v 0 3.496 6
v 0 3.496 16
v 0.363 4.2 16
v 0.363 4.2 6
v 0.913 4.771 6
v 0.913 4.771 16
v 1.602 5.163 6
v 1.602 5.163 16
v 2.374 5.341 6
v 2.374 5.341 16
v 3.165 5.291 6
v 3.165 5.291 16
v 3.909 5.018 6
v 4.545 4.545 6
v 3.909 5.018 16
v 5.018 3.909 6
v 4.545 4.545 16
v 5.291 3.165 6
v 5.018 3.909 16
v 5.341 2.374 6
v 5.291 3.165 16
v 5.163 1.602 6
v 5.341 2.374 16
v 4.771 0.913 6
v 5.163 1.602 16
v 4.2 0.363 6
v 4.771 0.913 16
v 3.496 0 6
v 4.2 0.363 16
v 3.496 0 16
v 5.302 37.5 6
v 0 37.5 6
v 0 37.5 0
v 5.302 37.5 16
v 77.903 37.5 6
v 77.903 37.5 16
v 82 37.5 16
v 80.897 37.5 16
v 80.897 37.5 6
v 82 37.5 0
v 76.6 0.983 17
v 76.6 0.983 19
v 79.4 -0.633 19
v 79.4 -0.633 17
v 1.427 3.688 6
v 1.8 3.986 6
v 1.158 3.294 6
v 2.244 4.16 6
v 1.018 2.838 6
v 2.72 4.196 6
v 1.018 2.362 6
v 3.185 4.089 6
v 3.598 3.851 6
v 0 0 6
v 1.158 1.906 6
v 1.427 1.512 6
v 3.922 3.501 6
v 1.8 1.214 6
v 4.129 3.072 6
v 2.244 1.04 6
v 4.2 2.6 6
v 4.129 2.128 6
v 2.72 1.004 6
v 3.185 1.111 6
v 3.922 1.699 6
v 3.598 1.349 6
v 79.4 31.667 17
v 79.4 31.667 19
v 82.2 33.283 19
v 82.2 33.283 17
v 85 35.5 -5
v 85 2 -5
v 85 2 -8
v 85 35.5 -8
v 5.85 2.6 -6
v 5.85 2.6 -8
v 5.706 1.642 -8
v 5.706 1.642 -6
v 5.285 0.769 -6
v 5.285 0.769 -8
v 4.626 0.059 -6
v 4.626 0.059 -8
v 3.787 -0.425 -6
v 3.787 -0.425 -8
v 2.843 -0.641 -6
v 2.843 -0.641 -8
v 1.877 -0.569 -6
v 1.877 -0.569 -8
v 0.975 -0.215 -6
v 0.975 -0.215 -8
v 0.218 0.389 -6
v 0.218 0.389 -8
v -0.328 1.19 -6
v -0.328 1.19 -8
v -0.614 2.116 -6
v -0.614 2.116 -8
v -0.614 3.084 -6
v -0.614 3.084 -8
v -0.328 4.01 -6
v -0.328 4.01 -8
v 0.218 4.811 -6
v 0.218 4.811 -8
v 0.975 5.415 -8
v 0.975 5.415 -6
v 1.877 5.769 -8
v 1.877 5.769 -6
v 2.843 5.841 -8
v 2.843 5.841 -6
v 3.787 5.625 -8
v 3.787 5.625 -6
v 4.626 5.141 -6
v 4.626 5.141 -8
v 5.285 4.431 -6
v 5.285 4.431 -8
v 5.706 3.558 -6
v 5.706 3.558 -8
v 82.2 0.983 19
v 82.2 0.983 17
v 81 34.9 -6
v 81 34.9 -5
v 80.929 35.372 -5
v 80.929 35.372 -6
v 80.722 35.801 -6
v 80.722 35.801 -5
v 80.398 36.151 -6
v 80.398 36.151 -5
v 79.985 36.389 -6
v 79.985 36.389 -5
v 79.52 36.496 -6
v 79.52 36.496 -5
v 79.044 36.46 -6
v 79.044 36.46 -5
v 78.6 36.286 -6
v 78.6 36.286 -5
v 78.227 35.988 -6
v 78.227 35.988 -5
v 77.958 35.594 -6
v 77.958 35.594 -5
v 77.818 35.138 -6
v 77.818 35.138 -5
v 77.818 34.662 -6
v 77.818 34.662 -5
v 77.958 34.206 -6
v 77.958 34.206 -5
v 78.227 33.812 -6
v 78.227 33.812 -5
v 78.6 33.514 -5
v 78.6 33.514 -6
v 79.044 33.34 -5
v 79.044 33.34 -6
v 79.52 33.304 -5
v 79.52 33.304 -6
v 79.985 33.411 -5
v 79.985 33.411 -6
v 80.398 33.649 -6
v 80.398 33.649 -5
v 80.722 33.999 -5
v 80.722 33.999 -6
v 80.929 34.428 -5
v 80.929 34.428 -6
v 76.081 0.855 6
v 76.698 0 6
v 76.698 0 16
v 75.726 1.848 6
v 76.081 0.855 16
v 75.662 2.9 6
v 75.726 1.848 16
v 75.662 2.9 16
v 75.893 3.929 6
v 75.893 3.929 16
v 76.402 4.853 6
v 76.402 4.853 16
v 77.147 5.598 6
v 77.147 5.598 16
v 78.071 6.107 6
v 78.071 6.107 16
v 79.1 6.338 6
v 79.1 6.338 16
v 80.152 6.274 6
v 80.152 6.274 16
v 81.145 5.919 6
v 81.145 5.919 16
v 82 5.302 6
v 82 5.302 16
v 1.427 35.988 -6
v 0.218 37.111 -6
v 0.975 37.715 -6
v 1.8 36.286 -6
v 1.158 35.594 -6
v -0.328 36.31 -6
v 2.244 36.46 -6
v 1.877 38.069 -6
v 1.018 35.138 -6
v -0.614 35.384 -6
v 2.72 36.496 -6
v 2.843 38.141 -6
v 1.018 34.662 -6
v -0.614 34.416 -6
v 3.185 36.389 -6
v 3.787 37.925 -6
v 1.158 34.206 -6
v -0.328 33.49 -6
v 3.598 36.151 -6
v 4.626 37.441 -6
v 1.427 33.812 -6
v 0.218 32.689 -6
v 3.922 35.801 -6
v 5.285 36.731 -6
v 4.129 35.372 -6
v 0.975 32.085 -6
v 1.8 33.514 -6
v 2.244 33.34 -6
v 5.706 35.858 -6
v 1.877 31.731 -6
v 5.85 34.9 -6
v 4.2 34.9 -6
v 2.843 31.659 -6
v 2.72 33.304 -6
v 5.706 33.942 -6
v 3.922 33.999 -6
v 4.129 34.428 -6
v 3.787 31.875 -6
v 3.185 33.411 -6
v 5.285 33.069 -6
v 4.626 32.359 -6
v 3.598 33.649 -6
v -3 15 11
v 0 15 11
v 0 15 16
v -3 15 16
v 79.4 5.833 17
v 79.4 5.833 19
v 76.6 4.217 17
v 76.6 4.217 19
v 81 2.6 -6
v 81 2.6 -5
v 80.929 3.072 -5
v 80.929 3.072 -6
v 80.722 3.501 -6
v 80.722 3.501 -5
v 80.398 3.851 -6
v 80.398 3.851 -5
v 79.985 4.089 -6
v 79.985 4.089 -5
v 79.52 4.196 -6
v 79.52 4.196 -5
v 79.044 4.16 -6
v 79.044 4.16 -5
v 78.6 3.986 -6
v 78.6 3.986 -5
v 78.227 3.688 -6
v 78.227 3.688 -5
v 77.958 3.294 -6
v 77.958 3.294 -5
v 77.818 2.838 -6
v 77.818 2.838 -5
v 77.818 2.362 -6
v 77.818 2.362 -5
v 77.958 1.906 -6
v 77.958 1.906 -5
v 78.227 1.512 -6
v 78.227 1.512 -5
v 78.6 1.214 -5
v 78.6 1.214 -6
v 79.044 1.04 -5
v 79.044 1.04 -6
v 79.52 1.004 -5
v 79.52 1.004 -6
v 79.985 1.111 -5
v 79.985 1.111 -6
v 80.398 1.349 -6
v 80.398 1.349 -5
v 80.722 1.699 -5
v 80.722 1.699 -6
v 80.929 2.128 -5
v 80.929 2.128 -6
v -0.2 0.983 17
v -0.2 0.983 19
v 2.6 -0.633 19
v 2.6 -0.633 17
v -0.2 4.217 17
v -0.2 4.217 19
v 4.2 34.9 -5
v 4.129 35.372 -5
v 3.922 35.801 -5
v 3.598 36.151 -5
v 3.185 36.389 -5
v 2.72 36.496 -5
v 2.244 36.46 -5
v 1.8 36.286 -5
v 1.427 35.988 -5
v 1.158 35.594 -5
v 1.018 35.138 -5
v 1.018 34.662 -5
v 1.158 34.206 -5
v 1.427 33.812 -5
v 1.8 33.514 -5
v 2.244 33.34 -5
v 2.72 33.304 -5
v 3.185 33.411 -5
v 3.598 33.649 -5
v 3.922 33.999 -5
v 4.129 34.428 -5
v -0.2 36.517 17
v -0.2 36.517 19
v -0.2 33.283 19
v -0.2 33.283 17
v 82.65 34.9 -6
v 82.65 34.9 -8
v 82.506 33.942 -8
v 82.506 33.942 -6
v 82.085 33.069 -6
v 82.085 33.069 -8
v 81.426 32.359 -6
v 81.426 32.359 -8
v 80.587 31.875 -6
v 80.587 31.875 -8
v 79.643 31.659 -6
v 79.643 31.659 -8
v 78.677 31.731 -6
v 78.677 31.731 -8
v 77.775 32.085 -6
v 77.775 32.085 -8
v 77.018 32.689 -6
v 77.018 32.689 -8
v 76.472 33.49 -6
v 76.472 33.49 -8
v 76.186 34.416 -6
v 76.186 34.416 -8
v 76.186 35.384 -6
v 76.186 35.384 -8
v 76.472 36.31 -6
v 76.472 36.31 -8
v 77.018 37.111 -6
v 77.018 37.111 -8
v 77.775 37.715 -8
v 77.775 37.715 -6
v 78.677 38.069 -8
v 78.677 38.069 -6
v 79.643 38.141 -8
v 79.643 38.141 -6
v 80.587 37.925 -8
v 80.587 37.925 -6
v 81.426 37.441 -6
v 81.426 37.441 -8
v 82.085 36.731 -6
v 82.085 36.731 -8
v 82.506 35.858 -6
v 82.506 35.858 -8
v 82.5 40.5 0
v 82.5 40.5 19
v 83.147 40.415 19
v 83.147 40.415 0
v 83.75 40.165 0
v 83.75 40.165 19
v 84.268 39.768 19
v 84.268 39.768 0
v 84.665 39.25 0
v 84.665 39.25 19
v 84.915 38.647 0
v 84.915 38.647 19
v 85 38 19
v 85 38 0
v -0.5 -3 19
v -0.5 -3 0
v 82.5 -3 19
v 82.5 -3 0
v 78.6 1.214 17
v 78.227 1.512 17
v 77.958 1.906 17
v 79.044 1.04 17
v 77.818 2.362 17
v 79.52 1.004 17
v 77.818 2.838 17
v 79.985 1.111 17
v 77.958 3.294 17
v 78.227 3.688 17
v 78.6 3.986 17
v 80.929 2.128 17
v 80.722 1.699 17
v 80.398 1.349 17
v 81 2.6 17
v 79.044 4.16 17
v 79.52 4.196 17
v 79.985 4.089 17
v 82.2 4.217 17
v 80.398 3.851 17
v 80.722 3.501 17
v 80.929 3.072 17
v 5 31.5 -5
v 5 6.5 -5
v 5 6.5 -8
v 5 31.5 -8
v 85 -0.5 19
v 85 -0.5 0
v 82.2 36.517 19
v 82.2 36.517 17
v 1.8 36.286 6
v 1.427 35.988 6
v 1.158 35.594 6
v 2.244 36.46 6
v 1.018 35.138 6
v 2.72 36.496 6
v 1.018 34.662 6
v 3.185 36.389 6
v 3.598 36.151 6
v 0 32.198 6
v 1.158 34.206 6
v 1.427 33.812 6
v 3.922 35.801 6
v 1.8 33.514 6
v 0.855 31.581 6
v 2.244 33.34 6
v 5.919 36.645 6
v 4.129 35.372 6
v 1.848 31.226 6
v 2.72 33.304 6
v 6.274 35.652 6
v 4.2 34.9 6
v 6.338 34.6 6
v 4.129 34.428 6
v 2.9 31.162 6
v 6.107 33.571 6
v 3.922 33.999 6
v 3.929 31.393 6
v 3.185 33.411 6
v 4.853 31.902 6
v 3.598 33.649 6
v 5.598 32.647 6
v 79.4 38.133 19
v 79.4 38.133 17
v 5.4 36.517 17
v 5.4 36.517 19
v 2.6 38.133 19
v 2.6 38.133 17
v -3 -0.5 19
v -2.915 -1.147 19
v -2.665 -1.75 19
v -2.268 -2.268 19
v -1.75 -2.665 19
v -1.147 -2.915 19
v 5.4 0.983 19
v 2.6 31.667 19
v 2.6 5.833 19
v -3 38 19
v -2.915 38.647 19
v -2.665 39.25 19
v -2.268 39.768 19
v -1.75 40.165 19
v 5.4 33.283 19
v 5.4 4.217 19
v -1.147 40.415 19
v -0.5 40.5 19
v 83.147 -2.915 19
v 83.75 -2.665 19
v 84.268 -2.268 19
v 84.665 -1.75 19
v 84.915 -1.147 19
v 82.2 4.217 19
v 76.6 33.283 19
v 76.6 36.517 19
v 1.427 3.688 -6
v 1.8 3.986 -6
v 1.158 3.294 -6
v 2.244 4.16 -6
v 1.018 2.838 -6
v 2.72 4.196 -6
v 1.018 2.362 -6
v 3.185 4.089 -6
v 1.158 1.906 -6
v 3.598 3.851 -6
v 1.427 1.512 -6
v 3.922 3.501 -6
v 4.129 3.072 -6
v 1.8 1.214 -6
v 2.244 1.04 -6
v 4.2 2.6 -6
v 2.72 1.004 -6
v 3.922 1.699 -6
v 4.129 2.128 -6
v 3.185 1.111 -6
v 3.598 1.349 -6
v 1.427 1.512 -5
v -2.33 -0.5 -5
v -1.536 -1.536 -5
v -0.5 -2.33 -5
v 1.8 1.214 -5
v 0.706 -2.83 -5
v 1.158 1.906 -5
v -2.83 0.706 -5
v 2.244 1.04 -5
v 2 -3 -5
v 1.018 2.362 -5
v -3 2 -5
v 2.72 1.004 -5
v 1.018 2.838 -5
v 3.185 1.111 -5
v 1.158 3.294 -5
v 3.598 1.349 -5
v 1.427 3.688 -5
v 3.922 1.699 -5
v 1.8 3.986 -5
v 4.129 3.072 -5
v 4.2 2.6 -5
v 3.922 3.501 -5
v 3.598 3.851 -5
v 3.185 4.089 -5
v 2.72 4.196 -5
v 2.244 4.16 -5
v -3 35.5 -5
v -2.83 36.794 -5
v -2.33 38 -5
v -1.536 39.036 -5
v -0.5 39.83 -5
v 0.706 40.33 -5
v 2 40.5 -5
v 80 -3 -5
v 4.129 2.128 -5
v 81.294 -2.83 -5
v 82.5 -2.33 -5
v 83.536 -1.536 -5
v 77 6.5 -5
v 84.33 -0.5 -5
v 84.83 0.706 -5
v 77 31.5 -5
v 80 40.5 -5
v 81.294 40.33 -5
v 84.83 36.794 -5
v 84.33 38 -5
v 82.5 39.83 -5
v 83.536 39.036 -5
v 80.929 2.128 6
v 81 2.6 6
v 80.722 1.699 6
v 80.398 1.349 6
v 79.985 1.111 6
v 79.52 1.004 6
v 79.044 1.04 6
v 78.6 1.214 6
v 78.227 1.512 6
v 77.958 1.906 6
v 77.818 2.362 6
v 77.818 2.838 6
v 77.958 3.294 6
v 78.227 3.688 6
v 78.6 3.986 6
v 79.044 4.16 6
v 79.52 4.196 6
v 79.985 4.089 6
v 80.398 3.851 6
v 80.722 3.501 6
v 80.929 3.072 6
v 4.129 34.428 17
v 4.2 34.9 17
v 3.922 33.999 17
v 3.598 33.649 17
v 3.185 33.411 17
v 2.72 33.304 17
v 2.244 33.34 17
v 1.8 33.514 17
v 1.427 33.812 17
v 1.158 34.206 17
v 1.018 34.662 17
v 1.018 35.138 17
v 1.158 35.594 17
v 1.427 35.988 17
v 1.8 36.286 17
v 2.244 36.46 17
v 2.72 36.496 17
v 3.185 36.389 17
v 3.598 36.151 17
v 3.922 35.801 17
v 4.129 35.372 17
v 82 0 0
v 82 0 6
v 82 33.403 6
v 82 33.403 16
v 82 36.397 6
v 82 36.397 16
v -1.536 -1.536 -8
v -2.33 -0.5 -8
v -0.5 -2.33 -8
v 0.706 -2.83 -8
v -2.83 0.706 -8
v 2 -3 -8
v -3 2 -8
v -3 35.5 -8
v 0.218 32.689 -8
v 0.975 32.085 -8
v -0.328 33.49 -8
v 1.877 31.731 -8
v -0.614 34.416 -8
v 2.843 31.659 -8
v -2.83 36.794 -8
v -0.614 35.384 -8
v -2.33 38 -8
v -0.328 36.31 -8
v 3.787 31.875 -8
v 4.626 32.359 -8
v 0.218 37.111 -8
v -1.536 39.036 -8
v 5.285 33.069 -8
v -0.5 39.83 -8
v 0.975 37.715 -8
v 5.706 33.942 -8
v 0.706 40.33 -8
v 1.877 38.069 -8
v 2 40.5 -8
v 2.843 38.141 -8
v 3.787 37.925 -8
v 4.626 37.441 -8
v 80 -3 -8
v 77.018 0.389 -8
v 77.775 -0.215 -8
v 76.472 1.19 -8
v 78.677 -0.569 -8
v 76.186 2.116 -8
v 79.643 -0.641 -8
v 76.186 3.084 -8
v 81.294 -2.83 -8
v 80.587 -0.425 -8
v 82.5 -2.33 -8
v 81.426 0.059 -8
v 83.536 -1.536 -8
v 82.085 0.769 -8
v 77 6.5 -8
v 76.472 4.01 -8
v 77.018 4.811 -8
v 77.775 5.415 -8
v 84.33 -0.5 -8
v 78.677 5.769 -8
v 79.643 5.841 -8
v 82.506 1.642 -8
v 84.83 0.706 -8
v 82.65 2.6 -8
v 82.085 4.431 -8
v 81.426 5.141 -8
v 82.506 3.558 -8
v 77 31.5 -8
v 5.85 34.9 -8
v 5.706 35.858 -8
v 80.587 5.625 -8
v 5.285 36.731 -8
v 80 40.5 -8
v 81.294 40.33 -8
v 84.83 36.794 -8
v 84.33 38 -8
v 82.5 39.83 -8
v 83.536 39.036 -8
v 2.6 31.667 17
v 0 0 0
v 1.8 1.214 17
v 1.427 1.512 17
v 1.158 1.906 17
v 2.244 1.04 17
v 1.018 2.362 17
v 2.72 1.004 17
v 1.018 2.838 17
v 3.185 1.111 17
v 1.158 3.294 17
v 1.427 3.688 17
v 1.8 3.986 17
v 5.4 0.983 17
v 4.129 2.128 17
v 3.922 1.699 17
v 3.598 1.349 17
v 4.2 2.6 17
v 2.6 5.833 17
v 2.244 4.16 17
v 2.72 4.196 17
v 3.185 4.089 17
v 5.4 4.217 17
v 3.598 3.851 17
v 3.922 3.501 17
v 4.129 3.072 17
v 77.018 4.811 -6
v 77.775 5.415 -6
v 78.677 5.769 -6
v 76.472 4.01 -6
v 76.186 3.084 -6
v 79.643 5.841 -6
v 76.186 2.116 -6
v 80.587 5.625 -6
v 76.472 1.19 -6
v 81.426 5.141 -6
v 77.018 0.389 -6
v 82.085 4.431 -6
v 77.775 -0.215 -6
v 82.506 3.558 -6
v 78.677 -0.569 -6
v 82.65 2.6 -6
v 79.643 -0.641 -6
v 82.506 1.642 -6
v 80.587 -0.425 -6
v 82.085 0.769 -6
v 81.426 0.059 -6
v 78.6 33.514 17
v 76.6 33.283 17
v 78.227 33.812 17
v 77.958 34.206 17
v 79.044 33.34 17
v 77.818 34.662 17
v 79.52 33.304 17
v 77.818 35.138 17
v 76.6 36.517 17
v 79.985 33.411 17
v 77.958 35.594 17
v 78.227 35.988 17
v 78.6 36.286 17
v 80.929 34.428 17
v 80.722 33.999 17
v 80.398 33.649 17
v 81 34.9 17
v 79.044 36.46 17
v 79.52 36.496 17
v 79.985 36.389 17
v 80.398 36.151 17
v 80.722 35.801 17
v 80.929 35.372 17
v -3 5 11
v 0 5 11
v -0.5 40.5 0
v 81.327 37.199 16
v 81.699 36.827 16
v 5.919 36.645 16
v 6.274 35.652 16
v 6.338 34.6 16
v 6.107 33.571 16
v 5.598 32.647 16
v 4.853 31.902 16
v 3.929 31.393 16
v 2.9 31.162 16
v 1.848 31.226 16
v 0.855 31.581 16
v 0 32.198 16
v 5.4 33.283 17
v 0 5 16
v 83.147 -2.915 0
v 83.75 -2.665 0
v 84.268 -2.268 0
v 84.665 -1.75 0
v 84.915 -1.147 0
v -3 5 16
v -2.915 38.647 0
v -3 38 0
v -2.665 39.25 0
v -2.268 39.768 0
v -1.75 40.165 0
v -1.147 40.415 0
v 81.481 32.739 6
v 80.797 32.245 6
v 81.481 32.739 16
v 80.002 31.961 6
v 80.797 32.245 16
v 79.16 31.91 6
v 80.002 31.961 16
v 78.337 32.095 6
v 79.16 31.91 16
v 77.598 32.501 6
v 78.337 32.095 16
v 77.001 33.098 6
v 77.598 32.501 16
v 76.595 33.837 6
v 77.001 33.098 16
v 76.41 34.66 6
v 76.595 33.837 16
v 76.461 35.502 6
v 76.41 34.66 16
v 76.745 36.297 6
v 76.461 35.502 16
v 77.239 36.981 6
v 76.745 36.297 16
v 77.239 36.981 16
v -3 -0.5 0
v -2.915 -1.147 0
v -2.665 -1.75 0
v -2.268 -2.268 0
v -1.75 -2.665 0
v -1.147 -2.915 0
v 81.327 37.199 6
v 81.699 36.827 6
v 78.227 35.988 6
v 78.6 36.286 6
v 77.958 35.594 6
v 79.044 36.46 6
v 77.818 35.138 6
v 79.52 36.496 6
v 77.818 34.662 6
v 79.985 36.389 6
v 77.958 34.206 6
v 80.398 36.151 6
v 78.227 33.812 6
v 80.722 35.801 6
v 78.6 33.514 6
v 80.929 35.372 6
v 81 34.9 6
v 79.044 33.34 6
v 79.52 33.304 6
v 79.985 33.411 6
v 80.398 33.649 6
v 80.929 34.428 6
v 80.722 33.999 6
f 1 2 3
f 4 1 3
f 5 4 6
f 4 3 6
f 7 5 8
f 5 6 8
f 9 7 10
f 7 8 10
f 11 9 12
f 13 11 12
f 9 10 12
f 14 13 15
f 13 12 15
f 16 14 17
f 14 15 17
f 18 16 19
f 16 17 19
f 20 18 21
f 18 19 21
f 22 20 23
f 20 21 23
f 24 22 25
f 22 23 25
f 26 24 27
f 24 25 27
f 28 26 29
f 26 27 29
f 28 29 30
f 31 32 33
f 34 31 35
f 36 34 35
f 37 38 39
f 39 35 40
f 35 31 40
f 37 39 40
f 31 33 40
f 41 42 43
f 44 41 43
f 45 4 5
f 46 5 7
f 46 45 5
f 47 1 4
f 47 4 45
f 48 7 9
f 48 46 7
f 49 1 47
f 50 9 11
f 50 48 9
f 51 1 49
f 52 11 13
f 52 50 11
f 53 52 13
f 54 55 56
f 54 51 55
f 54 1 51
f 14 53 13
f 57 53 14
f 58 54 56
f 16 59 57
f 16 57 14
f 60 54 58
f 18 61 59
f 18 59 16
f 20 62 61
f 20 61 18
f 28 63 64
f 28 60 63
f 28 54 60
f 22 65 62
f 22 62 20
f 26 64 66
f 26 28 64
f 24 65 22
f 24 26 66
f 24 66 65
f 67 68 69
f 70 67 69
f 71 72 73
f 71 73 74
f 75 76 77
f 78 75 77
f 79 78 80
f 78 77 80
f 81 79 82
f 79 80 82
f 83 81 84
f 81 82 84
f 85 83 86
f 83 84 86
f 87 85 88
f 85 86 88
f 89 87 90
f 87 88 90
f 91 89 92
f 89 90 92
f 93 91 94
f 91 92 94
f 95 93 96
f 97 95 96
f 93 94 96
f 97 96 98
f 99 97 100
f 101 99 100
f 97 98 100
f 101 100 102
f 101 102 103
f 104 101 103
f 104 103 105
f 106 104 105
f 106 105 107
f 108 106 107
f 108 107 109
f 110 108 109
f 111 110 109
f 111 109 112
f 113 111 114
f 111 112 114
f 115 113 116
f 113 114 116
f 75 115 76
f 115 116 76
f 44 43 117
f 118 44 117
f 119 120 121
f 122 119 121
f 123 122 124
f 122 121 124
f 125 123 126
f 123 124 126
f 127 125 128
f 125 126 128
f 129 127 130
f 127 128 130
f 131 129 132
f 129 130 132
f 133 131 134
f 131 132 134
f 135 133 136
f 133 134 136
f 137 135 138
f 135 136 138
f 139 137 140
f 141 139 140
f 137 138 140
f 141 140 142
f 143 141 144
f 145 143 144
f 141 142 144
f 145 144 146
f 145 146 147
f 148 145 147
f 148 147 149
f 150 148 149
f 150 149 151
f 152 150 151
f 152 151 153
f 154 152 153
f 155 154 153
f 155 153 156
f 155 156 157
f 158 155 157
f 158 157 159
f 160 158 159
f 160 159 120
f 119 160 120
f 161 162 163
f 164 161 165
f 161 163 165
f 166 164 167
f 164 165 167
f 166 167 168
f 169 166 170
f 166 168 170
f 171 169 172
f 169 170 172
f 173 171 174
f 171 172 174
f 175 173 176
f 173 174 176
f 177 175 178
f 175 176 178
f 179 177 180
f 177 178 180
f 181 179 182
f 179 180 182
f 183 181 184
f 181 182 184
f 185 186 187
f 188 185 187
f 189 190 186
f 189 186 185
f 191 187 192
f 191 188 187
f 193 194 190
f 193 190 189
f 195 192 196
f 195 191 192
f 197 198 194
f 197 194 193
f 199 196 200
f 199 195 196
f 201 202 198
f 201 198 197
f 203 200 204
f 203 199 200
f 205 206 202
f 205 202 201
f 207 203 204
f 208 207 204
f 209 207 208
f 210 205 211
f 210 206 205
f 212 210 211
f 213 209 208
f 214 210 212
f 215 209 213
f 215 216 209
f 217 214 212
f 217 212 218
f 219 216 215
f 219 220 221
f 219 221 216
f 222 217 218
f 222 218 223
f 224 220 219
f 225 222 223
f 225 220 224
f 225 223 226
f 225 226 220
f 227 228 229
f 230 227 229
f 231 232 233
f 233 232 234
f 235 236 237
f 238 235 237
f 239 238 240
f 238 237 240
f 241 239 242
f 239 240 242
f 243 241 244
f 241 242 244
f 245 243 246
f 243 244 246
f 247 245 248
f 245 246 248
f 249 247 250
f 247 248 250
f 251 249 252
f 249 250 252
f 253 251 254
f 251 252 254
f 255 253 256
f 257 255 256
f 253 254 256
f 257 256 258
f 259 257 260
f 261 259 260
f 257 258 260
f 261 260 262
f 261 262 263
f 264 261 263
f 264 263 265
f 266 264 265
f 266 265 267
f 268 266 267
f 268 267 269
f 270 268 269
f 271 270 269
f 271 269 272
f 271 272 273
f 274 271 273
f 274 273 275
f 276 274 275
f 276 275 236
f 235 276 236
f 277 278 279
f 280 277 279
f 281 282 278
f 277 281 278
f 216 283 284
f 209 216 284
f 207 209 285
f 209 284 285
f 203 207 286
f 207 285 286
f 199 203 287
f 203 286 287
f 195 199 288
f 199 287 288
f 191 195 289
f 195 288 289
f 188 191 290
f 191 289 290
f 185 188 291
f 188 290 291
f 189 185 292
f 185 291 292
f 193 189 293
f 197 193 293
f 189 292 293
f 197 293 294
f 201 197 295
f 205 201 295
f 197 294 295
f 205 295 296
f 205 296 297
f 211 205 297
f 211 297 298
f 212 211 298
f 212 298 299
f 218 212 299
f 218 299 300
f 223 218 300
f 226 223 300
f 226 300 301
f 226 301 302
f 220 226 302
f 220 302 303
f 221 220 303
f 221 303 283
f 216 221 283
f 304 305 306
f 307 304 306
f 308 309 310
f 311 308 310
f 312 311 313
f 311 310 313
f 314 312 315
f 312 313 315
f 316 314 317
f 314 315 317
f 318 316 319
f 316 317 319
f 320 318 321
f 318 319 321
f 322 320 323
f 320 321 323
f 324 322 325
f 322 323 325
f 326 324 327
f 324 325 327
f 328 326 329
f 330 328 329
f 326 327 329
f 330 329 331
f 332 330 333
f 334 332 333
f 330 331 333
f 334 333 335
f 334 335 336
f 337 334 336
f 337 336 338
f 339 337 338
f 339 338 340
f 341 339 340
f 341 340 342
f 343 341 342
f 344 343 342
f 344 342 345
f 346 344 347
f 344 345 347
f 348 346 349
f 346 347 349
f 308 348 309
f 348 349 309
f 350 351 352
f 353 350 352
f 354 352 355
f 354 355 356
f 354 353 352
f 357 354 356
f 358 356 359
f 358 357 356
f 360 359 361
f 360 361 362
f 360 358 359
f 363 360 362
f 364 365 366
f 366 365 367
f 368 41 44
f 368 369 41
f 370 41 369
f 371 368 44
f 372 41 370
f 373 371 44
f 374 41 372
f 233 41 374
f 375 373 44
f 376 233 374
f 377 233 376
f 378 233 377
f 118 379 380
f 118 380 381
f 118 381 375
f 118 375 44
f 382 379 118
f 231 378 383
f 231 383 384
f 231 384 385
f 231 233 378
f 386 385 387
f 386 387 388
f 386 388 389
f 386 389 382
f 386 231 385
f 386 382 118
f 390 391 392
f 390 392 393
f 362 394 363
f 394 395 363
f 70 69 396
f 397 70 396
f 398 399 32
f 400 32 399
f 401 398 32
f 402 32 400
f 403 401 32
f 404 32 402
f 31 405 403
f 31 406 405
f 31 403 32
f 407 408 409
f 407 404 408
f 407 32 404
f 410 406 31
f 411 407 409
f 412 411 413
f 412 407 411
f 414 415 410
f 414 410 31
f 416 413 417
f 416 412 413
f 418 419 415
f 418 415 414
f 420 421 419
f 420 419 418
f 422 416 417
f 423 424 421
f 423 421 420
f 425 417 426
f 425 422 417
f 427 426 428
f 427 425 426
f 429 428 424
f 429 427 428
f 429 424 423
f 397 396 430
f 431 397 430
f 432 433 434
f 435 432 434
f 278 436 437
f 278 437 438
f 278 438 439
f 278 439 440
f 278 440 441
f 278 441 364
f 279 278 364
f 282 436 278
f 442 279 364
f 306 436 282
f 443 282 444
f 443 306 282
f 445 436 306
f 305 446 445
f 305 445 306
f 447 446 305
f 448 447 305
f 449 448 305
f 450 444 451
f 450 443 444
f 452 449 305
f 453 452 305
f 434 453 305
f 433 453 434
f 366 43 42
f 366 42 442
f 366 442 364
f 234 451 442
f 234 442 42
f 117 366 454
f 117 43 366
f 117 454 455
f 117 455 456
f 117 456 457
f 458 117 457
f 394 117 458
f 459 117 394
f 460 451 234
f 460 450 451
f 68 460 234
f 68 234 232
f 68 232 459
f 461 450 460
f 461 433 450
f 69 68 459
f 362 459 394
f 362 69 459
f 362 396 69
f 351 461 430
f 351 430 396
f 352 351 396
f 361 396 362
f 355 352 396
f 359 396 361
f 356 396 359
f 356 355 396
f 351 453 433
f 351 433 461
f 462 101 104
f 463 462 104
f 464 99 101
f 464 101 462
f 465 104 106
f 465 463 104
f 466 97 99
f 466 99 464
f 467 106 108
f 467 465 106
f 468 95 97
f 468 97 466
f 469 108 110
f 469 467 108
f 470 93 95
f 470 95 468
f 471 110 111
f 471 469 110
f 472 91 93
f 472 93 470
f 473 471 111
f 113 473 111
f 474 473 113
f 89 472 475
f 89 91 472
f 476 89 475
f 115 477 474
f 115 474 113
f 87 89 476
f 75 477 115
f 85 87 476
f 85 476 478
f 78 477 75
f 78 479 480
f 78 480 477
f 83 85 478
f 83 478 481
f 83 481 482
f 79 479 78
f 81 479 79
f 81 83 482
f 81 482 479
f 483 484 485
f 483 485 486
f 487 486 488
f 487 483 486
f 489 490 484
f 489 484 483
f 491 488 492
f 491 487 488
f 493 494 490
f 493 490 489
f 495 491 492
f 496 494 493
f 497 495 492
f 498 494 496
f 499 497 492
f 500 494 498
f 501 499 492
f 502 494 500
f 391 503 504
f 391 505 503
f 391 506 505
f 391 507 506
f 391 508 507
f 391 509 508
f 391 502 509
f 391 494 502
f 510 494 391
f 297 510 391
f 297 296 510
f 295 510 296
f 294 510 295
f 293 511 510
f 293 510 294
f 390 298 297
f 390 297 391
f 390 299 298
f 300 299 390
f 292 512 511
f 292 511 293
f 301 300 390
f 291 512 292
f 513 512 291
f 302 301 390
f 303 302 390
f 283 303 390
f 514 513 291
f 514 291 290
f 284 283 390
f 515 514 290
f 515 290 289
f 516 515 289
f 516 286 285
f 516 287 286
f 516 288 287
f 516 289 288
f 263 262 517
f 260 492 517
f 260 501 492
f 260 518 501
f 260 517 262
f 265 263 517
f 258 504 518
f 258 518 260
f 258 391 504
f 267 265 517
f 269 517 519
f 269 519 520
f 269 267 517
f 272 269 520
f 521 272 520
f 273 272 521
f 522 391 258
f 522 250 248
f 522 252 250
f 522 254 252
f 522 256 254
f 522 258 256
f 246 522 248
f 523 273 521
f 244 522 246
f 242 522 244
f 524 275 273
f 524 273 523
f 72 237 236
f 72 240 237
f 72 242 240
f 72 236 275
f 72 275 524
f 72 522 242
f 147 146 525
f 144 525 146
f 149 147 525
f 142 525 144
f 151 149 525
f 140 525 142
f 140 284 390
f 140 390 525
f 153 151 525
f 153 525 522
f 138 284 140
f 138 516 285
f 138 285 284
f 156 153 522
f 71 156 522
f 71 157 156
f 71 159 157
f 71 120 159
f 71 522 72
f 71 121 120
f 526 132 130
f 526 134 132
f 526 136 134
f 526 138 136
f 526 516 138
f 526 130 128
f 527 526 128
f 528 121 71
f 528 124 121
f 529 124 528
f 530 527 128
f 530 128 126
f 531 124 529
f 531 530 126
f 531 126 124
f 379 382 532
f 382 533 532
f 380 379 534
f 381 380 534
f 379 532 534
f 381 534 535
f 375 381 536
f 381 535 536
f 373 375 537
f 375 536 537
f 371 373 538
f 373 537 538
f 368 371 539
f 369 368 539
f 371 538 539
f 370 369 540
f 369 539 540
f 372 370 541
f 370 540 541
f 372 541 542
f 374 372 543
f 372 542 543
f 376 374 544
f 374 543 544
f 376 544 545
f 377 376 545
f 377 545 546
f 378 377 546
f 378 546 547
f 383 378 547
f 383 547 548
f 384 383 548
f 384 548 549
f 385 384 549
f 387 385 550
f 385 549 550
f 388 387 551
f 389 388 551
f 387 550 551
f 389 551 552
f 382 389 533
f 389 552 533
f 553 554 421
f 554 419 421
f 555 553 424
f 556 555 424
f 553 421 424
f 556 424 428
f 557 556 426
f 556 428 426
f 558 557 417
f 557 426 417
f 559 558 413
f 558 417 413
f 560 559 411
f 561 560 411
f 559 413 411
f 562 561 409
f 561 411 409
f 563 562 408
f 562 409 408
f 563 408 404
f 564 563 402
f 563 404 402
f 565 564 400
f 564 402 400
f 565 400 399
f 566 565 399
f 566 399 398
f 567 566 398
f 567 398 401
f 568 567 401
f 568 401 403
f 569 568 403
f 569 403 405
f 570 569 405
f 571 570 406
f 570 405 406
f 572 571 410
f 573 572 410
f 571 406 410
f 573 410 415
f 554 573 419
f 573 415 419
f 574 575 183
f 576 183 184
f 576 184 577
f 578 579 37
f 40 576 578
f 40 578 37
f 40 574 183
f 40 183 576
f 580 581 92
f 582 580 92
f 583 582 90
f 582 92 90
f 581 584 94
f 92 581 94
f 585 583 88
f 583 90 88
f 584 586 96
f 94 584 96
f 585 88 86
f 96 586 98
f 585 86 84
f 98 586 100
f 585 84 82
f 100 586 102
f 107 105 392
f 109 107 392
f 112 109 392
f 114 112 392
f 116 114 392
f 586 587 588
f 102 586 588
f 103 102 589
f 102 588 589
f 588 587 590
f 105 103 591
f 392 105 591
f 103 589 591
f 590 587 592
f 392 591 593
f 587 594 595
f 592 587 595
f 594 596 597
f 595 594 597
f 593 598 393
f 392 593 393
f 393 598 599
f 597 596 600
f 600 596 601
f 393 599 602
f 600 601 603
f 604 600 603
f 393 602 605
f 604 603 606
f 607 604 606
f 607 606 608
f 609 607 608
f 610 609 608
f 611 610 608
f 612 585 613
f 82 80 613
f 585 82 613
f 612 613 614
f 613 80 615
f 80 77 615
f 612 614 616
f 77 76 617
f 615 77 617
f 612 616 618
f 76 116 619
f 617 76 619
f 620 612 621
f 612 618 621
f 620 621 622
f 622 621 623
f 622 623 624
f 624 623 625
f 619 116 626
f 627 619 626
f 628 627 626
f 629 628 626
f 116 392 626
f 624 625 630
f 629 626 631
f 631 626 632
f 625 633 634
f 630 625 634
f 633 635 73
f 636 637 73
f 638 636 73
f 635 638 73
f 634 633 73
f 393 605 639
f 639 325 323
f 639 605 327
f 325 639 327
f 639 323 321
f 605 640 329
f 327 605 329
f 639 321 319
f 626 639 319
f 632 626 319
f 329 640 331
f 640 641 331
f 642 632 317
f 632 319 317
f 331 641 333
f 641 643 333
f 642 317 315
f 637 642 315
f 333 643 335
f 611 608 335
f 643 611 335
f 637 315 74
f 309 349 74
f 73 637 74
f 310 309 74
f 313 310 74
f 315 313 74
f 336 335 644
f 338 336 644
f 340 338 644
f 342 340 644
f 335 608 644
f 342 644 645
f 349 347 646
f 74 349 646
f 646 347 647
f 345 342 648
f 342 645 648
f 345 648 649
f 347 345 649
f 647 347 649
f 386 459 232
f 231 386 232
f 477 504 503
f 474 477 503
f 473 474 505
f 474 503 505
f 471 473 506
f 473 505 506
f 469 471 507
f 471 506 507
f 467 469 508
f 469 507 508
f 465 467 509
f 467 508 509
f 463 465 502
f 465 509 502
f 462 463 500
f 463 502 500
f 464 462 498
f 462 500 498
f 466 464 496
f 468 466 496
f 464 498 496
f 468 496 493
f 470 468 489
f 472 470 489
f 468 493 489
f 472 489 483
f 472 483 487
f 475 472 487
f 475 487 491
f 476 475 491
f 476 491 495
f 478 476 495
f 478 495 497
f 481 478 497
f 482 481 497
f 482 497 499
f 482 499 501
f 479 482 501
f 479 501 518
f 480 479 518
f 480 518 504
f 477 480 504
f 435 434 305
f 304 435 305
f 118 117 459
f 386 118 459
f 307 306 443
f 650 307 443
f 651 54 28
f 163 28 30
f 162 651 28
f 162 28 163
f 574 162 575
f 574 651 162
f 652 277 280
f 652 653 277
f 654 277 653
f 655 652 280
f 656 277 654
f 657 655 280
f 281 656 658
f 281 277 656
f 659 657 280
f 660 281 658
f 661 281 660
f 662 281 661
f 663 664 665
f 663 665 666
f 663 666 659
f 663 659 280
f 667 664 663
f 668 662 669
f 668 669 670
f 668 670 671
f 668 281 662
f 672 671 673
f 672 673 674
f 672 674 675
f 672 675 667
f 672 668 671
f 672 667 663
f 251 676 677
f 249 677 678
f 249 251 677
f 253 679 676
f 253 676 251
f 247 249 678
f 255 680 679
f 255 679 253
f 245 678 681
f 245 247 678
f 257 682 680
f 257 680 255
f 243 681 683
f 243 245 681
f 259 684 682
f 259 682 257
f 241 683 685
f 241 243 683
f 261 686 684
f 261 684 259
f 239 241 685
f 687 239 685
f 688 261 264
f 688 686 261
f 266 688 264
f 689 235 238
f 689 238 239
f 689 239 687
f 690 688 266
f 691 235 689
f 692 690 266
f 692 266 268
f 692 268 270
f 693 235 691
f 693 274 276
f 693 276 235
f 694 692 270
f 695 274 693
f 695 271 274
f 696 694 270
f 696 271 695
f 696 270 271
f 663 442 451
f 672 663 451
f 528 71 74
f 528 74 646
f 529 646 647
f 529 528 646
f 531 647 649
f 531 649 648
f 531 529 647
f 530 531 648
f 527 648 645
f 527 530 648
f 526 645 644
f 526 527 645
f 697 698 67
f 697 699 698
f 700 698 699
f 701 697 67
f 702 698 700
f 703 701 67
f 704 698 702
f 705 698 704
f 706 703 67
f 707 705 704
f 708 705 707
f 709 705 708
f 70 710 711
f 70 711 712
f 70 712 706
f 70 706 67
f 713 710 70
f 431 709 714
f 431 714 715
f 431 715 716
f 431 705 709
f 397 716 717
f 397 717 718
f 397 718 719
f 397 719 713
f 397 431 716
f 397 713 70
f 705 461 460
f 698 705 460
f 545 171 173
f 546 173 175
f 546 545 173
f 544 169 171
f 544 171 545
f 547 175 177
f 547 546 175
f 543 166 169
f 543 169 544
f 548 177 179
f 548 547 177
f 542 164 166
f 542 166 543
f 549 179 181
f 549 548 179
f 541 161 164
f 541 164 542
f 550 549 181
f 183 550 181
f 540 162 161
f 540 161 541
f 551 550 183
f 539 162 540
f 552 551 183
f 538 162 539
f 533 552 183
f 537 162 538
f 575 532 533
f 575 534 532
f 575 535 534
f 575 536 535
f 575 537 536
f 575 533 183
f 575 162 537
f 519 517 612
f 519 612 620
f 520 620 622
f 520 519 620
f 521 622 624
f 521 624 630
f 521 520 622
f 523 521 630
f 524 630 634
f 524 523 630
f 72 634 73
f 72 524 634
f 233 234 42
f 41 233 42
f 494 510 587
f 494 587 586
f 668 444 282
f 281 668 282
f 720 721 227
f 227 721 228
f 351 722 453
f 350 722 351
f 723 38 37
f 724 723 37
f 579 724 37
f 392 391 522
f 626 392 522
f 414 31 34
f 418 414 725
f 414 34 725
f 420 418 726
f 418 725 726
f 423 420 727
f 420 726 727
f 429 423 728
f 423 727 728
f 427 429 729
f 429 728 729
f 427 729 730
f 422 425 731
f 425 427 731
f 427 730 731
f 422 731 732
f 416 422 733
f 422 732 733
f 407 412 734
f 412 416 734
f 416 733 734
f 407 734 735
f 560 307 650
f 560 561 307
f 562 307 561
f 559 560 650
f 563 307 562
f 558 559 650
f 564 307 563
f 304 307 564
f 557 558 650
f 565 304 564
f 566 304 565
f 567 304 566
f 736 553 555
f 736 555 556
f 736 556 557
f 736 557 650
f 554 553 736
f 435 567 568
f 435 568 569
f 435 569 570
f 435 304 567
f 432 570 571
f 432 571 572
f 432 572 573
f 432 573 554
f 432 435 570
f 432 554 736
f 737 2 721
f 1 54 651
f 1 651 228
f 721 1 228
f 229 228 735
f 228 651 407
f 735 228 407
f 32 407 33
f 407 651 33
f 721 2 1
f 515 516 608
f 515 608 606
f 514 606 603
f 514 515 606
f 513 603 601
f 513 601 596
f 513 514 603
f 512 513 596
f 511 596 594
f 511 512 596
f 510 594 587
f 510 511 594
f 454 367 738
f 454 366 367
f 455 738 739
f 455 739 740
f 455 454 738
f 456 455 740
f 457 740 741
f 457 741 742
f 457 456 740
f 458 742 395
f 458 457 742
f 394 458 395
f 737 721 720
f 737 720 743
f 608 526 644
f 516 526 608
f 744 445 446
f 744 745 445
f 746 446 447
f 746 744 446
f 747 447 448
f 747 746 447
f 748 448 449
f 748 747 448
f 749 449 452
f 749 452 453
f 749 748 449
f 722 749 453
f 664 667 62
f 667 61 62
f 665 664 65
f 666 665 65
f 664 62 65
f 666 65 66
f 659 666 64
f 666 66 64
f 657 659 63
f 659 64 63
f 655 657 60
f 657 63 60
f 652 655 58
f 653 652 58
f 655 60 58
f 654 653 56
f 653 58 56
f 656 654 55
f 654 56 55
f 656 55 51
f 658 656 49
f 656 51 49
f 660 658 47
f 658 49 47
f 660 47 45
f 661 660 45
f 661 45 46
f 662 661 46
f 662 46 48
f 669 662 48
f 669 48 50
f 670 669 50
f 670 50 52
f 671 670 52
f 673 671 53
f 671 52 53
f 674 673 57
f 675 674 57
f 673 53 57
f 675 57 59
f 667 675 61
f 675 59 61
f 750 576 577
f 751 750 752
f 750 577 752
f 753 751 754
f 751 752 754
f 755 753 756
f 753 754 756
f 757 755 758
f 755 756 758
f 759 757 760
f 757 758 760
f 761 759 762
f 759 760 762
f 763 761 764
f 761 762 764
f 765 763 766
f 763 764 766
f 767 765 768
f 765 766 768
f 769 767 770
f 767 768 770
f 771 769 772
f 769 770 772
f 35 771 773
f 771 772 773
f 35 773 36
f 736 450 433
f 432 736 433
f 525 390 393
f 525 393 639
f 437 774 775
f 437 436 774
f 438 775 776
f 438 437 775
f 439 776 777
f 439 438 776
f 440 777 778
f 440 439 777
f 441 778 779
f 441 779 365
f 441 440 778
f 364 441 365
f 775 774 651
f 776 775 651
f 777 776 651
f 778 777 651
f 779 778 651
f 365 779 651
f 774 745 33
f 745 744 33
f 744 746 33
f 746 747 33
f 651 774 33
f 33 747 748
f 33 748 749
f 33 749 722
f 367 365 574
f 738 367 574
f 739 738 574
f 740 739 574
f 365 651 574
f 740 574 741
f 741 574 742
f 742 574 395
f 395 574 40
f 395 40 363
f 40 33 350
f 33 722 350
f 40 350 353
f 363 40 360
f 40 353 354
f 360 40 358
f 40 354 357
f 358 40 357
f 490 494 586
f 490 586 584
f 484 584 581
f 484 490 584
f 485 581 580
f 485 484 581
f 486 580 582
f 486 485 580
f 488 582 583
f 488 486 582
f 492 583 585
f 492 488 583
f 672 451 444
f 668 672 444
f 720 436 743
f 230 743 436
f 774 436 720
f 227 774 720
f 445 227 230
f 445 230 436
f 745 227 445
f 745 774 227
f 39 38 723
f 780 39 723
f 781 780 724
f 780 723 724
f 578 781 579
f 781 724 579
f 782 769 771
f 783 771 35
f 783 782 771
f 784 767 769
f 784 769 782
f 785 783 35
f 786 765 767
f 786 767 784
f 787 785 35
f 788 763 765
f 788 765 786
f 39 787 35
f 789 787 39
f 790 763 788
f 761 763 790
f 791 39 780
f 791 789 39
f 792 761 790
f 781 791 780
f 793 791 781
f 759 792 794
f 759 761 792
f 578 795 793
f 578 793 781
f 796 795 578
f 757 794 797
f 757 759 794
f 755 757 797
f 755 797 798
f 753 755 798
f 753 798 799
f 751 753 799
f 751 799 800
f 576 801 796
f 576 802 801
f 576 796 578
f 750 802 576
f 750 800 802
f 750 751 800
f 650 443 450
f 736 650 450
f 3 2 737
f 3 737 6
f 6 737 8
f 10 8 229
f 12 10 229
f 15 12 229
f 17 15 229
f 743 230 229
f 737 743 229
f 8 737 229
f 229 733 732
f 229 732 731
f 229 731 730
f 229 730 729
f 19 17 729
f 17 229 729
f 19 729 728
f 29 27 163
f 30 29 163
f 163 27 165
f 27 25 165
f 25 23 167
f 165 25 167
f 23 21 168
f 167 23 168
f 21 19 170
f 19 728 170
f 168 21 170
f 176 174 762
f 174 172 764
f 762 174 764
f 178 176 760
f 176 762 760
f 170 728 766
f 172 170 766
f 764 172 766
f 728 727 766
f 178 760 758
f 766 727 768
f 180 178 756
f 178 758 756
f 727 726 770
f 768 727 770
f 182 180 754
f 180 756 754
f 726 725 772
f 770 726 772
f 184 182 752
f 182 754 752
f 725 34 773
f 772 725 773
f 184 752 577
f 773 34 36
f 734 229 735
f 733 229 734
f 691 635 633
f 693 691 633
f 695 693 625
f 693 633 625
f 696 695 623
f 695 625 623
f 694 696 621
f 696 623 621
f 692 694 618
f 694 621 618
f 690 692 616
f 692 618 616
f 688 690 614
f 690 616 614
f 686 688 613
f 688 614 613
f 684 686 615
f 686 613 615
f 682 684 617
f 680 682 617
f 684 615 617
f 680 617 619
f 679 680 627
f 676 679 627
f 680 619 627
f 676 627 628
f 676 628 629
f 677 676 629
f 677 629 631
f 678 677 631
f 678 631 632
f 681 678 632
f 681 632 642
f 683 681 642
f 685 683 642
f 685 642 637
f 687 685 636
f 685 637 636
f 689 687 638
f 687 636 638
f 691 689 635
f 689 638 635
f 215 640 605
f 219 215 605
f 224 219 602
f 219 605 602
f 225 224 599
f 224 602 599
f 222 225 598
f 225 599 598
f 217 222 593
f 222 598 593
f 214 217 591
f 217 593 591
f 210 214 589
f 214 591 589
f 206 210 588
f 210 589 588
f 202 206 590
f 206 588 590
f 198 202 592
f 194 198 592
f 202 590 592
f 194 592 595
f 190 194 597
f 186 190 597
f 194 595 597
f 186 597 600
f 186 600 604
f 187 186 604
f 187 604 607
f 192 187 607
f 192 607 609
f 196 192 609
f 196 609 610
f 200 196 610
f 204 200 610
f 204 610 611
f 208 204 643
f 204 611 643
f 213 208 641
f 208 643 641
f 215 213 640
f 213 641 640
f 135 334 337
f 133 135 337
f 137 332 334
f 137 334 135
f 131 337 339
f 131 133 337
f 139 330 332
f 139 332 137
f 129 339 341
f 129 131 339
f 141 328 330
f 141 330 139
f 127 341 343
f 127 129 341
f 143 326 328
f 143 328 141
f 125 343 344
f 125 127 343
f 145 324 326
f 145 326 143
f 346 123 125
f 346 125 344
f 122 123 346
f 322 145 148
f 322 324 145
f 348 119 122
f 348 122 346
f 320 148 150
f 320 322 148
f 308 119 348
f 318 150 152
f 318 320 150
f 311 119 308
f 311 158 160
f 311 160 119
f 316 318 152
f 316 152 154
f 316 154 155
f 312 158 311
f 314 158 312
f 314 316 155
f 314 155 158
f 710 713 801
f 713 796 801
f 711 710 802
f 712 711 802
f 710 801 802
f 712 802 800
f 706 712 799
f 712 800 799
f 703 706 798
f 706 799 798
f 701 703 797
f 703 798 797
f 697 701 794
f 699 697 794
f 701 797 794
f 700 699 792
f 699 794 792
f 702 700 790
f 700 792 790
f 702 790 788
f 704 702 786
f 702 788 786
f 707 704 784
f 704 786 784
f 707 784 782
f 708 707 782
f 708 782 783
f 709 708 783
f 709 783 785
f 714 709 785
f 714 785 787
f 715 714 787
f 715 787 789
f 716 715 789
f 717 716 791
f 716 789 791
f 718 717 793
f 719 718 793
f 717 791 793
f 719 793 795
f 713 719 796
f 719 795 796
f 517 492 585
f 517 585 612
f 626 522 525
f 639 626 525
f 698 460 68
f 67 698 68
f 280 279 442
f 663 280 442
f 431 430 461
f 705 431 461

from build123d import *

# Parameters (mm, degrees)
F0_W      = 88
F0_H      = 43.5
F0_W_2    = 82
F0_H_2    = 37.5
F1_DEPTH  = 16
F2_W      = 88
F2_H      = 43.5
F3_DEPTH  = 3
F4_R      = 1.6
F4_R_2    = 3.75
F4_R_3    = 3
F5_DEPTH  = 10
F6_W      = 10
F6_H      = 5
F7_DEPTH  = 25
F8_R      = 1.6
F9_DEPTH  = 25
F11_DEPTH = 2
F12_R     = 2.5
F14_R     = 1.6
F14_W     = 72
F14_H     = 25
F15_DEPTH = 3
F16_R     = 3.25
F17_DEPTH = 2


with BuildPart() as f1:
    # F0 (on Top) → F1 (new body)
    with BuildSketch(Plane.XY):
        with Locations((41, 18.75)):
            Rectangle(F0_W, F0_H)
        with Locations((41, 18.75)):
            Rectangle(F0_W_2, F0_H_2, mode=Mode.SUBTRACT)
    extrude(amount=F1_DEPTH)

    # F2 (on face) → F3 (join)
    with BuildSketch(Plane.XY.offset(16)):
        with Locations((41, 18.75)):
            Rectangle(F2_W, F2_H)
    extrude(amount=F3_DEPTH)

    # F4 (on face) → F5 (join)
    with BuildSketch(Plane(origin=(0, 0, 16), x_dir=(1, 0, 0), z_dir=(0, 0, -1))):
        with BuildLine():
            Line((-0.674958, 0.433956), (-0.149295, -2.662282))
            ThreePointArc((-0.149295, -2.662282), (4.492342, -4.59538), (2.807823, 0.142136))
            Line((2.807823, 0.142136), (-0.674958, 0.433956))
        make_face()
        with Locations((2.6, -2.6)):
            Circle(F4_R, mode=Mode.SUBTRACT)
        with Locations((79.4, -2.6)):
            Circle(F4_R_2)
        with Locations((79.4, -2.6)):
            Circle(F4_R, mode=Mode.SUBTRACT)
        with Locations((79.4, -34.9)):
            Circle(F4_R_3)
        with Locations((79.4, -34.9)):
            Circle(F4_R, mode=Mode.SUBTRACT)
        with Locations((2.6, -34.9)):
            Circle(F4_R_2)
        with Locations((2.6, -34.9)):
            Circle(F4_R, mode=Mode.SUBTRACT)
    extrude(amount=F5_DEPTH)

    # F6 (on face) → F7 (cut)
    with BuildSketch(Plane.YZ):
        with Locations((10, 13.5)):
            Rectangle(F6_W, F6_H)
    extrude(amount=-F7_DEPTH, mode=Mode.SUBTRACT)

    # F8 (on face) → F9 (cut)
    with BuildSketch(Plane(origin=(0, 0, 6), x_dir=(1, 0, 0), z_dir=(0, 0, -1))):
        with Locations((2.6, -2.6)):
            Circle(F8_R)
        with Locations((2.6, -34.9)):
            Circle(F8_R)
        with Locations((79.4, -34.9)):
            Circle(F8_R)
        with Locations((79.4, -2.6)):
            Circle(F8_R)
    extrude(amount=-F9_DEPTH, mode=Mode.SUBTRACT)

    # F10 (on face) → F11 (cut)
    with BuildSketch(Plane.XY.offset(19)):
        Polygon((-0.2, 4.216581), (-0.2, 0.983419), (2.6, -0.633162), (5.4, 0.983419), (5.4, 4.216581), (2.6, 5.833162), align=None)
        Polygon((-0.2, 36.516581), (-0.2, 33.283419), (2.6, 31.666838), (5.4, 33.283419), (5.4, 36.516581), (2.6, 38.133162), align=None)
        Polygon((82.2, 0.983419), (82.2, 4.216581), (79.4, 5.833162), (76.6, 4.216581), (76.6, 0.983419), (79.4, -0.633162), align=None)
        Polygon((82.2, 33.283419), (82.2, 36.516581), (79.4, 38.133162), (76.6, 36.516581), (76.6, 33.283419), (79.4, 31.666838), align=None)
    extrude(amount=-F11_DEPTH, mode=Mode.SUBTRACT)

    # F12
    f12_edges = [f1.edges().sort_by_distance(p)[0] for p in [
        (-3, -3, 9.5),
        (85, -3, 9.5),
        (85, 40.5, 9.5),
        (-3, 40.5, 9.5),
    ]]
    fillet(f12_edges, radius=F12_R)


with BuildPart() as f15:
    # F14 (on offset) → F15 (new body)
    with BuildSketch(Plane.XY.offset(-5)):
        with BuildLine():
            Line((-3, 35.5), (-3, 2))
            ThreePointArc((-3, 2), (-1.535534, -1.535534), (2, -3))
            Line((2, -3), (80, -3))
            ThreePointArc((80, -3), (83.535534, -1.535534), (85, 2))
            Line((85, 2), (85, 35.5))
            ThreePointArc((85, 35.5), (83.535534, 39.035534), (80, 40.5))
            Line((80, 40.5), (2, 40.5))
            ThreePointArc((2, 40.5), (-1.535534, 39.035534), (-3, 35.5))
        make_face()
        with Locations((2.6, 2.6)):
            Circle(F14_R, mode=Mode.SUBTRACT)
        with Locations((79.4, 2.6)):
            Circle(F14_R, mode=Mode.SUBTRACT)
        with Locations((2.6, 34.9)):
            Circle(F14_R, mode=Mode.SUBTRACT)
        with Locations((41, 19)):
            Rectangle(F14_W, F14_H, mode=Mode.SUBTRACT)
        with Locations((79.4, 34.9)):
            Circle(F14_R, mode=Mode.SUBTRACT)
    extrude(amount=-F15_DEPTH)

    # F16 (on face) → F17 (cut)
    with BuildSketch(Plane(origin=(0, 0, -8), x_dir=(1, 0, 0), z_dir=(0, 0, -1))):
        with Locations((2.6, -2.6)):
            Circle(F16_R)
        with Locations((79.4, -2.6)):
            Circle(F16_R)
        with Locations((79.4, -34.9)):
            Circle(F16_R)
        with Locations((2.6, -34.9)):
            Circle(F16_R)
    extrude(amount=-F17_DEPTH, mode=Mode.SUBTRACT)


solid = Compound([f1.part, f15.part])
